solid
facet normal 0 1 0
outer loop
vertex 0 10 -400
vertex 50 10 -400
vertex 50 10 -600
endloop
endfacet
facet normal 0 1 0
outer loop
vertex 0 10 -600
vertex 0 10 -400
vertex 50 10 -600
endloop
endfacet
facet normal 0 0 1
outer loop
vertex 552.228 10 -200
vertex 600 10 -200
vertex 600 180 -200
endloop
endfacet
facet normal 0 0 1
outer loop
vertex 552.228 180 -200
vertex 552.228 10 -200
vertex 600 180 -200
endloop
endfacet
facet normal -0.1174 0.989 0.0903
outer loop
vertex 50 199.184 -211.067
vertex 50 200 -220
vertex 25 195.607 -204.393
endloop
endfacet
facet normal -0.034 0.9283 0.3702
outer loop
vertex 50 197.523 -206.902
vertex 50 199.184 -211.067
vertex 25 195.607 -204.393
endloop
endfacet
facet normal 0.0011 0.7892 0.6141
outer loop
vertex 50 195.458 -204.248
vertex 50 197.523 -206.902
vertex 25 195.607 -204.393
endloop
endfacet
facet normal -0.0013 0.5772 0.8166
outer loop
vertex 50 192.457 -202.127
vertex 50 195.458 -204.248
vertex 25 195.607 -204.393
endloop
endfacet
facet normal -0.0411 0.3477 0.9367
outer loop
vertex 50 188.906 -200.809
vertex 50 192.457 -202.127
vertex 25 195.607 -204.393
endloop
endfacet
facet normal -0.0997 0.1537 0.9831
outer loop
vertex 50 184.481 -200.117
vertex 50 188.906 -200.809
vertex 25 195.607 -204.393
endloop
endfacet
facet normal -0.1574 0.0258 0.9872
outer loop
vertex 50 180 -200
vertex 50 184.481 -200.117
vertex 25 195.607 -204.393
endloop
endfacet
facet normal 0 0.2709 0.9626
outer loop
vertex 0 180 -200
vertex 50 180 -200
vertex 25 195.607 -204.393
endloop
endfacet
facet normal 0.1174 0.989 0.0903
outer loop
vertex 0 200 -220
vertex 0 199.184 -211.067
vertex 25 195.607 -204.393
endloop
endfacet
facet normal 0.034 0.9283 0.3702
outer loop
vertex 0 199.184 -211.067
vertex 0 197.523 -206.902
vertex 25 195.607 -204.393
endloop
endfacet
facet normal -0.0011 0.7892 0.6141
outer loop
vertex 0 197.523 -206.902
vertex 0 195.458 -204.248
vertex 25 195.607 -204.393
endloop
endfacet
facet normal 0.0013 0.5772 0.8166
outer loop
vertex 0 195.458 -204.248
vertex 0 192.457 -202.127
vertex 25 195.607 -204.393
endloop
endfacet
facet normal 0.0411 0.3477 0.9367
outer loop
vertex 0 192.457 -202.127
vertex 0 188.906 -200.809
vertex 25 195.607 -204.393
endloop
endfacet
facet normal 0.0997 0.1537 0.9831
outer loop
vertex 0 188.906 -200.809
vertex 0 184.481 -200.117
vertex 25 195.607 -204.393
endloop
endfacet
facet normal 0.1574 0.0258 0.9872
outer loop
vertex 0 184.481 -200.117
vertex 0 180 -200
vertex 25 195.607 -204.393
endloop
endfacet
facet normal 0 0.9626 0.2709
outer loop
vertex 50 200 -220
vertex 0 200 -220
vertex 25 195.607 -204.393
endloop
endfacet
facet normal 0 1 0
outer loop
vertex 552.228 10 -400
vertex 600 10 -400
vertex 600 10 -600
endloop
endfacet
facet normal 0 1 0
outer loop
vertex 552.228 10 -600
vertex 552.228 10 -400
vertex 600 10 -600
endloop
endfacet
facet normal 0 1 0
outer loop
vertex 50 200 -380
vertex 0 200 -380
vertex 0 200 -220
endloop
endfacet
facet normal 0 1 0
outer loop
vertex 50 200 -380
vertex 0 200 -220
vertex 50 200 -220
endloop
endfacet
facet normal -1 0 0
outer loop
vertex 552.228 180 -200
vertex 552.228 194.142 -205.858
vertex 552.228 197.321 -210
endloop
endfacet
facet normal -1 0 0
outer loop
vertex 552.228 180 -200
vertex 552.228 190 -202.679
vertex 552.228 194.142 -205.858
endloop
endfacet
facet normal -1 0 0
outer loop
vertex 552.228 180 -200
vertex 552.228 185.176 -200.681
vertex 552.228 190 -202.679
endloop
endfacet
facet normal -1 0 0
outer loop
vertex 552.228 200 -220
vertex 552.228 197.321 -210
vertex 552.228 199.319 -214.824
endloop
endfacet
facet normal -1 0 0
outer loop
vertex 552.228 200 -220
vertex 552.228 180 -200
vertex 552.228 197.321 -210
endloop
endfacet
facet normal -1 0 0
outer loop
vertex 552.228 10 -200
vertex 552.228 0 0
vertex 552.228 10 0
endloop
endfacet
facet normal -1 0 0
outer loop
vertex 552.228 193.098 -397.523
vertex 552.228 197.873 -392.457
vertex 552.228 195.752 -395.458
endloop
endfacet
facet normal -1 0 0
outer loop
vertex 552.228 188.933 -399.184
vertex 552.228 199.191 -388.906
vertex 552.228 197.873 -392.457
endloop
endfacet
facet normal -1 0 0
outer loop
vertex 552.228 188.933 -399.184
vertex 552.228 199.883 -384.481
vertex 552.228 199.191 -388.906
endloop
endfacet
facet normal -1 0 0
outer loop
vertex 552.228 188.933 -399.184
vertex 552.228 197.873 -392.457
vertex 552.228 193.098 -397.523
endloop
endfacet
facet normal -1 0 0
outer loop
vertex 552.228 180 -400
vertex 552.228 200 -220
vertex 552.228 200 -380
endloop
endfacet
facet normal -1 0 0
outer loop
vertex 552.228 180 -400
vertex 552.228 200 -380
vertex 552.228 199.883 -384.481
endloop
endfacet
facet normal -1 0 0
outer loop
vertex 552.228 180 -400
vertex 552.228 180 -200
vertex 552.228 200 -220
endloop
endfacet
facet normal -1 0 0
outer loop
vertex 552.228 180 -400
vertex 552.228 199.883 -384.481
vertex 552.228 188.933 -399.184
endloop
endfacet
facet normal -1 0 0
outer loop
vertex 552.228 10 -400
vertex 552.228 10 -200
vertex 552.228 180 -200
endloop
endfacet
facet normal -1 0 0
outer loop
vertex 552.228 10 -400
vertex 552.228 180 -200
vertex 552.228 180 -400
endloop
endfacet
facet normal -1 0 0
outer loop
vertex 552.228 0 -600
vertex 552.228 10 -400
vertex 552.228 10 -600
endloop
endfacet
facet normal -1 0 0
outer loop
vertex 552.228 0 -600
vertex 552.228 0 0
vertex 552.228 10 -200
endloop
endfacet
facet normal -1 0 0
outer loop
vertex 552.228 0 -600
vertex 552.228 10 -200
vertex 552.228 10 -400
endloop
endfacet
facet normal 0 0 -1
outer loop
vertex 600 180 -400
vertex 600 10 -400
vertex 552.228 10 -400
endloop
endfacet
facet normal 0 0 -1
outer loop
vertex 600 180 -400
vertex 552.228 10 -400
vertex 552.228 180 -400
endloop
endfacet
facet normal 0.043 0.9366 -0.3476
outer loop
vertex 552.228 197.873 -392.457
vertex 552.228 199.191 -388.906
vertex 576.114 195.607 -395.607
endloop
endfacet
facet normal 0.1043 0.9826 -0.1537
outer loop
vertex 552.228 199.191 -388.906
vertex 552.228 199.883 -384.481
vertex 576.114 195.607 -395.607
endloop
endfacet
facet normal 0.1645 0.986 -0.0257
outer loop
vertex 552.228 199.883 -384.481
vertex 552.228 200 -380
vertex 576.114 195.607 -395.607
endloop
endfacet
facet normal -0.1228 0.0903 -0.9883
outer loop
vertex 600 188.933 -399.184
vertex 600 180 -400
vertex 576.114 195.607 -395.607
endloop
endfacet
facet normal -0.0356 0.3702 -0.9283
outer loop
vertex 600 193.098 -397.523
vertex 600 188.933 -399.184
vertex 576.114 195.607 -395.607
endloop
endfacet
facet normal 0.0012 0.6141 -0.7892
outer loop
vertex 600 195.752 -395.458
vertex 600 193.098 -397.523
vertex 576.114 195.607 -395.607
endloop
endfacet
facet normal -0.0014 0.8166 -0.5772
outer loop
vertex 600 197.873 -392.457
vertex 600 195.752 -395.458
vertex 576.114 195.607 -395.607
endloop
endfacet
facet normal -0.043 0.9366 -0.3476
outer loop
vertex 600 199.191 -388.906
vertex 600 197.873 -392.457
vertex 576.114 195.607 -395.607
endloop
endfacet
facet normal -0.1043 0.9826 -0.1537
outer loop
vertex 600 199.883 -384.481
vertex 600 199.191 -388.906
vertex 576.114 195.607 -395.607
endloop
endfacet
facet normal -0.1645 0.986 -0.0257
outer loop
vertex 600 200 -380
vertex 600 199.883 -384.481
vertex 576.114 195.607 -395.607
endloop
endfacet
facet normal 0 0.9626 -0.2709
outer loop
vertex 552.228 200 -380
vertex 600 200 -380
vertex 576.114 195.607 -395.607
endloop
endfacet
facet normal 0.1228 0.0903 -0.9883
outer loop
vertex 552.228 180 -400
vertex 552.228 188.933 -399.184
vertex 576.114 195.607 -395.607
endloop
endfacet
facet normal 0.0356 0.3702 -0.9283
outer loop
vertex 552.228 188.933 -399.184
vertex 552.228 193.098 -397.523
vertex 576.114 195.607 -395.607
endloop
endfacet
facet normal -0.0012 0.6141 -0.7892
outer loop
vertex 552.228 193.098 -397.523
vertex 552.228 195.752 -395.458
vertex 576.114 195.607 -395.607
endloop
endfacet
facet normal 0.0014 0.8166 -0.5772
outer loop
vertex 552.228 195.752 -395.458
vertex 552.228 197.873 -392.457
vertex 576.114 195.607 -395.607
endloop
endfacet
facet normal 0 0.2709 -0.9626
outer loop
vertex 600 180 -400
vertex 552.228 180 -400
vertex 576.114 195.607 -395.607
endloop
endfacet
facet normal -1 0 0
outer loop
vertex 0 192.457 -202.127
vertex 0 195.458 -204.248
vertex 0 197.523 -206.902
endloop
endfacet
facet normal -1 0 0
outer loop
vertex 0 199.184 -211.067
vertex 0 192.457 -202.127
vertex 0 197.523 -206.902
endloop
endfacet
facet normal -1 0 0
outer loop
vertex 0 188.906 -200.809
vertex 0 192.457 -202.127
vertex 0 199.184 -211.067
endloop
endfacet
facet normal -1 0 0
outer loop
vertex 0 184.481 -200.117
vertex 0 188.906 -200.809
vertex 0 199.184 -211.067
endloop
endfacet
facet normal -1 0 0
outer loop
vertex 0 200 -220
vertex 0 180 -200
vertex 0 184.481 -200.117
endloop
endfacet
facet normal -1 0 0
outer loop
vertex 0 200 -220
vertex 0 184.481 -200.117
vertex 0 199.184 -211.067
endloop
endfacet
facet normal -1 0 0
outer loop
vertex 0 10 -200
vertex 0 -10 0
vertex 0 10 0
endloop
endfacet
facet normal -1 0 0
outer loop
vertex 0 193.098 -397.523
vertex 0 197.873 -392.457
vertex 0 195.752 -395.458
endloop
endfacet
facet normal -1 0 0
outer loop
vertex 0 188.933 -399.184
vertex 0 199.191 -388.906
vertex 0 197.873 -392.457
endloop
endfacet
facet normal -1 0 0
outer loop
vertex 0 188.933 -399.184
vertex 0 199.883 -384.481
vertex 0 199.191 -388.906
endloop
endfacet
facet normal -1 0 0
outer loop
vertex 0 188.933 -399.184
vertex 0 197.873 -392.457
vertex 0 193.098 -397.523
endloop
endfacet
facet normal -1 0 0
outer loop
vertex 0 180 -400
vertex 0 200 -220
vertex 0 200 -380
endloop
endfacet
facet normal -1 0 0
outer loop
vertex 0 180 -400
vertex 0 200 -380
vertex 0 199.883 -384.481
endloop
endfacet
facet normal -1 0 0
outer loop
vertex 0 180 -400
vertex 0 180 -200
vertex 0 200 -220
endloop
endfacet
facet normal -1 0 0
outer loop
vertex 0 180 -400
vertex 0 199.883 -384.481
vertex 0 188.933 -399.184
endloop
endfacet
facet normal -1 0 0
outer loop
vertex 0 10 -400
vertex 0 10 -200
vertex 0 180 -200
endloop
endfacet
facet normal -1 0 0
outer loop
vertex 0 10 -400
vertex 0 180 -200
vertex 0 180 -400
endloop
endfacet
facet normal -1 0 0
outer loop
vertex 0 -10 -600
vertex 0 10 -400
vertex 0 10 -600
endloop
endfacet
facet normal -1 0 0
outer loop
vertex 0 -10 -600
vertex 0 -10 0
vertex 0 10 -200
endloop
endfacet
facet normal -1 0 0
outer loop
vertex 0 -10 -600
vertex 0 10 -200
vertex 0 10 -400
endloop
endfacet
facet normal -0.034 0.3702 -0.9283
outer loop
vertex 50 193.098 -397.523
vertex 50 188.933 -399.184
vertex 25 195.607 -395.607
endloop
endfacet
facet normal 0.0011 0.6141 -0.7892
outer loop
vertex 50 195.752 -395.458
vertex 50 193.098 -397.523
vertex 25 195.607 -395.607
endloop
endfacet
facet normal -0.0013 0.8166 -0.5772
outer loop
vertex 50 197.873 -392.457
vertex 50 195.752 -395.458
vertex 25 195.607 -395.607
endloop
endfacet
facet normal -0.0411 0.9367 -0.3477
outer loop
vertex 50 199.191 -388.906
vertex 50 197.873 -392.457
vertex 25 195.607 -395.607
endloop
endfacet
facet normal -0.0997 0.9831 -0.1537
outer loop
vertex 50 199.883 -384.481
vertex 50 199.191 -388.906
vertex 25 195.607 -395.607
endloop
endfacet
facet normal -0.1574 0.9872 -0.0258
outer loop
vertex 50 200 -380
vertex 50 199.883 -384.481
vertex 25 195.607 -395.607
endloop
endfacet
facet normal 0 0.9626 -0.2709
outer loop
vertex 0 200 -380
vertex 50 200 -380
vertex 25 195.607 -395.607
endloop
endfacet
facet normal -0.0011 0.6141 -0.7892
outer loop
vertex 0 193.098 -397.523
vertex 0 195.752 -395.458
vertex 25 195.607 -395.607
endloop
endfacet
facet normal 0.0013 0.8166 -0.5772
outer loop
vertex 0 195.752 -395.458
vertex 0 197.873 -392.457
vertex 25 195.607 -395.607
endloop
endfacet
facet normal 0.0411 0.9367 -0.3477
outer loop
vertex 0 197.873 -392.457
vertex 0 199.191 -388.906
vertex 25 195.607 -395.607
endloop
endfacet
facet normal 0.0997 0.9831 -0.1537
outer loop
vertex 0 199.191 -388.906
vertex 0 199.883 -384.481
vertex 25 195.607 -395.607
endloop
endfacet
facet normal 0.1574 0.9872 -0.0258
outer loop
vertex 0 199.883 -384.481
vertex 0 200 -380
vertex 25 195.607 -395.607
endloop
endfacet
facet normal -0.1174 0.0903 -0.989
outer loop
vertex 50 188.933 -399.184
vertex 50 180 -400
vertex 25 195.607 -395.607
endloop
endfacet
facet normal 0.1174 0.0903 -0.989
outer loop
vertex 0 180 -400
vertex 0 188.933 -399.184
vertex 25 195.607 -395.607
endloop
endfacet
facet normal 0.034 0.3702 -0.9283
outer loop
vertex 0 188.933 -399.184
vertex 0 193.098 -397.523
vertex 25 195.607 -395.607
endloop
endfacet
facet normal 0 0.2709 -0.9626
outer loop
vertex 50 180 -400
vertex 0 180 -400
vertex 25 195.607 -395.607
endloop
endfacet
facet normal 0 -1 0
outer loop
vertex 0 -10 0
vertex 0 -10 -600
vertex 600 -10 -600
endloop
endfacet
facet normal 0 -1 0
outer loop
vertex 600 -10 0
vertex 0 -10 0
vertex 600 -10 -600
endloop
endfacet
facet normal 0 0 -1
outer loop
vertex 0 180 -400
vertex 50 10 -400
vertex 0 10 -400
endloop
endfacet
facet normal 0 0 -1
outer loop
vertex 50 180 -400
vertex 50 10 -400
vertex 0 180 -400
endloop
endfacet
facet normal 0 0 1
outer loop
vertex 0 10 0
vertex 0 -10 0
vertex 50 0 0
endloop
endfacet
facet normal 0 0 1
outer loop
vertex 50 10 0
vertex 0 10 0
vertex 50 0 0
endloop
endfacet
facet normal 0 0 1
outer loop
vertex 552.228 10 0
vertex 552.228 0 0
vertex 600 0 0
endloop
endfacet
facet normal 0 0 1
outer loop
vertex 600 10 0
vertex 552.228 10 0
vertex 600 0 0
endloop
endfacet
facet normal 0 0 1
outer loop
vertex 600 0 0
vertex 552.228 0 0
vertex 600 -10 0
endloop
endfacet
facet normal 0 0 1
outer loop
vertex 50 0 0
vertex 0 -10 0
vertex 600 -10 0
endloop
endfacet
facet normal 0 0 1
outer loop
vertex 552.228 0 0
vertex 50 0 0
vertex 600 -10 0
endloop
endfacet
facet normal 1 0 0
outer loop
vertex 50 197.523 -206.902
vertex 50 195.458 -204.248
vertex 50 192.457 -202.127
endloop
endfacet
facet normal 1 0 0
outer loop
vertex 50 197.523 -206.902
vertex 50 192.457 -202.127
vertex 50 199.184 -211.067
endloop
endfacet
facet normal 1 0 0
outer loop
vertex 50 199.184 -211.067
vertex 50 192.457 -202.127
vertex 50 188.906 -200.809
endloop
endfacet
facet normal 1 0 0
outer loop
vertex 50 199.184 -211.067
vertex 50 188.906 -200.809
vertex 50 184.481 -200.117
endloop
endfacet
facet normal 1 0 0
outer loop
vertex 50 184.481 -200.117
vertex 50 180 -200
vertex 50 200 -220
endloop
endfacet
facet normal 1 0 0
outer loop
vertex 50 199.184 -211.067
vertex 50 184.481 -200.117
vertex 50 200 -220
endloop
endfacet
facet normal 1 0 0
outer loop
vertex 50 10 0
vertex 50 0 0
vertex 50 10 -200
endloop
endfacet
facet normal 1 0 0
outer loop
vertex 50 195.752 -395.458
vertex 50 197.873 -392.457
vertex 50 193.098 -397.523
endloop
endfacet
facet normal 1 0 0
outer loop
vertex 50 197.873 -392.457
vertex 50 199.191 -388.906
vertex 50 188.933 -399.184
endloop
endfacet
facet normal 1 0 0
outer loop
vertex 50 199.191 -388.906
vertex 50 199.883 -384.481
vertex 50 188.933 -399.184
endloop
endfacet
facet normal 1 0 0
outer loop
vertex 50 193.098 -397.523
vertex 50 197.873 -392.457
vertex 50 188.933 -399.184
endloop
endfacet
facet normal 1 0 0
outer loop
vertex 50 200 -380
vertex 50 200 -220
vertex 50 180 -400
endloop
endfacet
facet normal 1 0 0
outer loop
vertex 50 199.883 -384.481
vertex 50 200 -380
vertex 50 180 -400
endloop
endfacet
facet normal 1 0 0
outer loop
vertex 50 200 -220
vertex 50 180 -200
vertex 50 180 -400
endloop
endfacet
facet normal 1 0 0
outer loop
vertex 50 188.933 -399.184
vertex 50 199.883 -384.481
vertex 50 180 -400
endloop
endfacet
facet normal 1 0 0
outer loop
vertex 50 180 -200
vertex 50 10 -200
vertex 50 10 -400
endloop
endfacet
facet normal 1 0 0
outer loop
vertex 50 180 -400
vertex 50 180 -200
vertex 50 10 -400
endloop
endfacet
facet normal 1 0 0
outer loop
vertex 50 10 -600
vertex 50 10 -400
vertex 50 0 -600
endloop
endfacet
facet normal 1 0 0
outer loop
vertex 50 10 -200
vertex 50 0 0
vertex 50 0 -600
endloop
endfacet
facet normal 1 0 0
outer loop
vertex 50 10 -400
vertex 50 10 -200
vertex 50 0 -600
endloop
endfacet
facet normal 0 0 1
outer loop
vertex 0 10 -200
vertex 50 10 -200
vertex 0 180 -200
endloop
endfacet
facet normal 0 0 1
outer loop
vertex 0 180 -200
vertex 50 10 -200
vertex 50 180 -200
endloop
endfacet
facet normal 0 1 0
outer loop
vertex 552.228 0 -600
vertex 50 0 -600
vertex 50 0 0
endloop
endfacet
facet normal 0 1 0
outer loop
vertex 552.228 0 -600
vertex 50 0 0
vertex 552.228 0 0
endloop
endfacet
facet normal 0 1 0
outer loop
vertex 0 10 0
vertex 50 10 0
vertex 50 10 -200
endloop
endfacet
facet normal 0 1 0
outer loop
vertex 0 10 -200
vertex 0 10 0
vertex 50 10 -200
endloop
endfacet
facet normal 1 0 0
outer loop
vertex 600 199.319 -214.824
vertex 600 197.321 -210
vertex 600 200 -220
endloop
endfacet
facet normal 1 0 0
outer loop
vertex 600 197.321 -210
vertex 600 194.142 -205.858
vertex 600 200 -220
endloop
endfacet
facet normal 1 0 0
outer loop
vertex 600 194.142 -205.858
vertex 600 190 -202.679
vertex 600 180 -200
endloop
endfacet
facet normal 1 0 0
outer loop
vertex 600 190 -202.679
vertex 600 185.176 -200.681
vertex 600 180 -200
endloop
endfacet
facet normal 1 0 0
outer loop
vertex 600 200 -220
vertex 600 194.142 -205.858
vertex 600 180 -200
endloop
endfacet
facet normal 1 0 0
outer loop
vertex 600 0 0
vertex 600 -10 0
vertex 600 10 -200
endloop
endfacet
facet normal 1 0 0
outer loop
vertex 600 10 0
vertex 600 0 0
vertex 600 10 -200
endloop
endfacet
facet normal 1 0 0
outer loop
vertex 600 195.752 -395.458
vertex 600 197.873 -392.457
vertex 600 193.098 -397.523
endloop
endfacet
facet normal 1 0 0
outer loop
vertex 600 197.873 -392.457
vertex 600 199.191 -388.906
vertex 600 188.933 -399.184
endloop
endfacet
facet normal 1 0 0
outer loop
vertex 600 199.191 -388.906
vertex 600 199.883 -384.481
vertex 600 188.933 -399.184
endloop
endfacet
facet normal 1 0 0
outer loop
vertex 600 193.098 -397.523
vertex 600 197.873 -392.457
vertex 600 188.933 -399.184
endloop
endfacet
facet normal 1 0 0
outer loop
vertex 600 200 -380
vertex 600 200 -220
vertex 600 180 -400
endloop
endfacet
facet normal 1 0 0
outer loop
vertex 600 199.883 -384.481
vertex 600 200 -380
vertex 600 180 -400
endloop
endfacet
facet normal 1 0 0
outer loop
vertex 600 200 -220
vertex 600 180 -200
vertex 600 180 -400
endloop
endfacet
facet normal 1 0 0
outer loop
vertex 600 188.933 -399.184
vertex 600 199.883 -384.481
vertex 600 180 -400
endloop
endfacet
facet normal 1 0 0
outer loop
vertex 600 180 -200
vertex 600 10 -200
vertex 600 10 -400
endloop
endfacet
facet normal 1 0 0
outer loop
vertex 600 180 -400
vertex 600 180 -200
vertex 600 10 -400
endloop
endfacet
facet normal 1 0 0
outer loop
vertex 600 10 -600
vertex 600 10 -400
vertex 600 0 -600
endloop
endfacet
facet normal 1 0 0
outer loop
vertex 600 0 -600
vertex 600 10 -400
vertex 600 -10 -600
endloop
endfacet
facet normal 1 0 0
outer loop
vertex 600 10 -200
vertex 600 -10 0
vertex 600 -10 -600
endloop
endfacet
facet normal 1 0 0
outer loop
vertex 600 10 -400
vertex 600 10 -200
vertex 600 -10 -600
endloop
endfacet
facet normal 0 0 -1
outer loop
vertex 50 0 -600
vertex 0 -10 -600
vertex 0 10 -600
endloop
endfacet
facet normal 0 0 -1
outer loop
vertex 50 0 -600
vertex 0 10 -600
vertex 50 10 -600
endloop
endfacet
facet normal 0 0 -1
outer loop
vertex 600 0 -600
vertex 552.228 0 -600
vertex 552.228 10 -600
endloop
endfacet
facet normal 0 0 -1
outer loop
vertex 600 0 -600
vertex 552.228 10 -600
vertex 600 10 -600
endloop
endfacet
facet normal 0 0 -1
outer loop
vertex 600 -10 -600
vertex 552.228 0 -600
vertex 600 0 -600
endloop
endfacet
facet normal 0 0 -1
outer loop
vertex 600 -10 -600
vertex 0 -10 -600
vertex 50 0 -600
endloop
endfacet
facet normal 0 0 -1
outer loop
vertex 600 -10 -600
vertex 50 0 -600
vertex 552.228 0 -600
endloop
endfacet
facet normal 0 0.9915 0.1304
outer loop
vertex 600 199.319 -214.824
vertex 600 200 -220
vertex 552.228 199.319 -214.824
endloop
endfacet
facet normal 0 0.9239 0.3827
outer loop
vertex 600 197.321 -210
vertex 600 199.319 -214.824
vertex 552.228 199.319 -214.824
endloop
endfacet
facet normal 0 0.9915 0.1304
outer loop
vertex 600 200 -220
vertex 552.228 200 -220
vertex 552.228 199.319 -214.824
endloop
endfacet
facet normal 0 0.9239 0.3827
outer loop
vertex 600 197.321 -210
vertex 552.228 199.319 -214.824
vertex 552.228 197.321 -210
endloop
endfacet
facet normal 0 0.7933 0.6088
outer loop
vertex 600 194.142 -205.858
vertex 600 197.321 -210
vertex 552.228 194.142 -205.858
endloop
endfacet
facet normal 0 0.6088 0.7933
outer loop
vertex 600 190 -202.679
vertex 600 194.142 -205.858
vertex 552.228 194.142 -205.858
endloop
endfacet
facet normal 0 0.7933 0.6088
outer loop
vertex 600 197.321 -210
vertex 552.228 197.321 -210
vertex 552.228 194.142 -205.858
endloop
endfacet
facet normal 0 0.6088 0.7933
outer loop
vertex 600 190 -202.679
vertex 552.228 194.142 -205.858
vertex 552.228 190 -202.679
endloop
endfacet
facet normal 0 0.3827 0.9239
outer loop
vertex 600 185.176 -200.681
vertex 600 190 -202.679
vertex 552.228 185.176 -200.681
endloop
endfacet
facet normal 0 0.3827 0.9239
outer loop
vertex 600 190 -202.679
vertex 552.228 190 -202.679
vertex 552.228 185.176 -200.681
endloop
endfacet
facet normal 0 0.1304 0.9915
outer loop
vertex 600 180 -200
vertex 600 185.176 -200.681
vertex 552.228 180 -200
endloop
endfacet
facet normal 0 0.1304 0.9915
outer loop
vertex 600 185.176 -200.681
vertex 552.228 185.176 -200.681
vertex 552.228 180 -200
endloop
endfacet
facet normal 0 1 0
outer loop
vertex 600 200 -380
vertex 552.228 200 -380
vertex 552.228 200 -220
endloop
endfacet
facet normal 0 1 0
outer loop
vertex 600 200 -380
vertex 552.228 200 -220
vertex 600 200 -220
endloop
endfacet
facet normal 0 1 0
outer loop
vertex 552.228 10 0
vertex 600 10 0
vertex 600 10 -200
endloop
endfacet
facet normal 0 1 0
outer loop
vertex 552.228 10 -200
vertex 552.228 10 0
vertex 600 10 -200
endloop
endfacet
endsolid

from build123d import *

# Parameters (mm, degrees)
ESBO_O1_W                  = 50
ESBO_O1_H                  = 600
RESSALTO_EXTRUS_O1_DEPTH   = 200
ESBO_O1_W_2                = 47.772216991
RESSALTO_EXTRUS_O1_2_DEPTH = 200
RESSALTO_EXTRUS_O4_START   = -210
ESBO_O4_W                  = 600
ESBO_O4_H                  = 600
RESSALTO_EXTRUS_O4_DEPTH   = 10
ESBO_O5_W                  = 200
ESBO_O5_H                  = 190
CORTE_EXTRUS_O1_DEPTH      = 872.779788708
ESBO_O6_W                  = 200
ESBO_O6_H                  = 190
CORTE_EXTRUS_O2_DEPTH      = 600
FILETE2_R                  = 20
FILETE3_SIZE               = 20
FILETE4_SIZE               = 20
FILETE5_SIZE               = 20


with BuildPart() as part:
    # Esboço1 → Ressalto-extrusão1 (new body)
    with BuildSketch(Plane(origin=(0, 0, 0), x_dir=(1, 0, 0), z_dir=(0, 1, 0))):
        with Locations((25, 300)):
            Rectangle(ESBO_O1_W, ESBO_O1_H)
    extrude(amount=RESSALTO_EXTRUS_O1_DEPTH)



with BuildPart() as body_2:
    # Esboço1 → Ressalto-extrus_o1 2 (new body)
    with BuildSketch(Plane(origin=(0, 0, 0), x_dir=(1, 0, 0), z_dir=(0, 1, 0))):
        with Locations((576.113891505, 300)):
            Rectangle(ESBO_O1_W_2, ESBO_O1_H)
    extrude(amount=RESSALTO_EXTRUS_O1_2_DEPTH)


with BuildPart() as part_1:
    add(part.part)

    add(body_2.part)  # Ressalto-extrusão4 merges body 2
    # Esboço4 → Ressalto-extrusão4 (add)
    with BuildSketch(Plane(origin=(0, 200, 0), x_dir=(1, 0, 0), z_dir=(0, 1, 0)).offset(RESSALTO_EXTRUS_O4_START)):
        with Locations((300, 300)):
            Rectangle(ESBO_O4_W, ESBO_O4_H)
    extrude(amount=RESSALTO_EXTRUS_O4_DEPTH)

    # Esboço5 → Corte-extrusão1 (cut, through all)
    with BuildSketch(Plane(origin=(600, 0, 0), x_dir=(0, 0, -1), z_dir=(1, 0, 0))):
        with Locations((100, 105)):
            Rectangle(ESBO_O5_W, ESBO_O5_H)
    extrude(amount=-CORTE_EXTRUS_O1_DEPTH, mode=Mode.SUBTRACT)

    # Esboço6 → Corte-extrusão2 (cut)
    with BuildSketch(Plane(origin=(600, 0, 0), x_dir=(0, 0, -1), z_dir=(1, 0, 0))):
        with Locations((500, 105)):
            Rectangle(ESBO_O6_W, ESBO_O6_H)
    extrude(amount=-CORTE_EXTRUS_O2_DEPTH, mode=Mode.SUBTRACT)

    # Filete2
    filete2_edges = [part_1.edges().sort_by_distance(p)[0] for p in [
        (576.113891505, 200, -200),
    ]]
    fillet(filete2_edges, radius=FILETE2_R)

    # Filete3
    # a fillet whose section is not a circle: 20 mm, written as the material it takes off along each edge
    with BuildSketch(Plane(origin=(650, 200, -400), x_dir=(0, 0, 1), z_dir=(-1, 0, 0))) as filete3_piece_1:
        with BuildLine():
            add(Edge.make_bspline([(FILETE3_SIZE, 0), (FILETE3_SIZE * 0.831801948466, 0), (FILETE3_SIZE * 0.663603896932, 0), (FILETE3_SIZE * 0.292893218813, -FILETE3_SIZE * 0.0716919198361), (FILETE3_SIZE * 0.0716919198361, -FILETE3_SIZE * 0.292893218813), (0, -FILETE3_SIZE * 0.663603896932), (0, -FILETE3_SIZE * 0.831801948466), (0, -FILETE3_SIZE)], knots=[0, 0, 0, 0, 0, 0, 0.5, 0.5, 1, 1, 1, 1, 1, 1], degree=5))
            Line((0, -FILETE3_SIZE), (0, 0))
            Line((0, 0), (FILETE3_SIZE, 0))
        make_face()
    extrude(amount=147.772216991, mode=Mode.SUBTRACT)

    # Filete4
    # a fillet whose section is not a circle: 20 mm, written as the material it takes off along each edge
    with BuildSketch(Plane(origin=(100, 200, -200), x_dir=(0, -1, 0), z_dir=(-1, 0, 0))) as filete4_piece_1:
        with BuildLine():
            add(Edge.make_bspline([(FILETE4_SIZE, 0), (FILETE4_SIZE * 0.831801948466, 0), (FILETE4_SIZE * 0.663603896932, 0), (FILETE4_SIZE * 0.292893218813, -FILETE4_SIZE * 0.0716919198361), (FILETE4_SIZE * 0.0716919198361, -FILETE4_SIZE * 0.292893218813), (0, -FILETE4_SIZE * 0.663603896932), (0, -FILETE4_SIZE * 0.831801948466), (0, -FILETE4_SIZE)], knots=[0, 0, 0, 0, 0, 0, 0.5, 0.5, 1, 1, 1, 1, 1, 1], degree=5))
            Line((0, -FILETE4_SIZE), (0, 0))
            Line((0, 0), (FILETE4_SIZE, 0))
        make_face()
    extrude(amount=150, mode=Mode.SUBTRACT)

    # Filete5
    # a fillet whose section is not a circle: 20 mm, written as the material it takes off along each edge
    with BuildSketch(Plane(origin=(100, 200, -400), x_dir=(0, 0, 1), z_dir=(-1, 0, 0))) as filete5_piece_1:
        with BuildLine():
            add(Edge.make_bspline([(FILETE5_SIZE, 0), (FILETE5_SIZE * 0.831801948466, 0), (FILETE5_SIZE * 0.663603896932, 0), (FILETE5_SIZE * 0.292893218813, -FILETE5_SIZE * 0.0716919198361), (FILETE5_SIZE * 0.0716919198361, -FILETE5_SIZE * 0.292893218813), (0, -FILETE5_SIZE * 0.663603896932), (0, -FILETE5_SIZE * 0.831801948466), (0, -FILETE5_SIZE)], knots=[0, 0, 0, 0, 0, 0, 0.5, 0.5, 1, 1, 1, 1, 1, 1], degree=5))
            Line((0, -FILETE5_SIZE), (0, 0))
            Line((0, 0), (FILETE5_SIZE, 0))
        make_face()
    extrude(amount=150, mode=Mode.SUBTRACT)


solid = part_1.part
